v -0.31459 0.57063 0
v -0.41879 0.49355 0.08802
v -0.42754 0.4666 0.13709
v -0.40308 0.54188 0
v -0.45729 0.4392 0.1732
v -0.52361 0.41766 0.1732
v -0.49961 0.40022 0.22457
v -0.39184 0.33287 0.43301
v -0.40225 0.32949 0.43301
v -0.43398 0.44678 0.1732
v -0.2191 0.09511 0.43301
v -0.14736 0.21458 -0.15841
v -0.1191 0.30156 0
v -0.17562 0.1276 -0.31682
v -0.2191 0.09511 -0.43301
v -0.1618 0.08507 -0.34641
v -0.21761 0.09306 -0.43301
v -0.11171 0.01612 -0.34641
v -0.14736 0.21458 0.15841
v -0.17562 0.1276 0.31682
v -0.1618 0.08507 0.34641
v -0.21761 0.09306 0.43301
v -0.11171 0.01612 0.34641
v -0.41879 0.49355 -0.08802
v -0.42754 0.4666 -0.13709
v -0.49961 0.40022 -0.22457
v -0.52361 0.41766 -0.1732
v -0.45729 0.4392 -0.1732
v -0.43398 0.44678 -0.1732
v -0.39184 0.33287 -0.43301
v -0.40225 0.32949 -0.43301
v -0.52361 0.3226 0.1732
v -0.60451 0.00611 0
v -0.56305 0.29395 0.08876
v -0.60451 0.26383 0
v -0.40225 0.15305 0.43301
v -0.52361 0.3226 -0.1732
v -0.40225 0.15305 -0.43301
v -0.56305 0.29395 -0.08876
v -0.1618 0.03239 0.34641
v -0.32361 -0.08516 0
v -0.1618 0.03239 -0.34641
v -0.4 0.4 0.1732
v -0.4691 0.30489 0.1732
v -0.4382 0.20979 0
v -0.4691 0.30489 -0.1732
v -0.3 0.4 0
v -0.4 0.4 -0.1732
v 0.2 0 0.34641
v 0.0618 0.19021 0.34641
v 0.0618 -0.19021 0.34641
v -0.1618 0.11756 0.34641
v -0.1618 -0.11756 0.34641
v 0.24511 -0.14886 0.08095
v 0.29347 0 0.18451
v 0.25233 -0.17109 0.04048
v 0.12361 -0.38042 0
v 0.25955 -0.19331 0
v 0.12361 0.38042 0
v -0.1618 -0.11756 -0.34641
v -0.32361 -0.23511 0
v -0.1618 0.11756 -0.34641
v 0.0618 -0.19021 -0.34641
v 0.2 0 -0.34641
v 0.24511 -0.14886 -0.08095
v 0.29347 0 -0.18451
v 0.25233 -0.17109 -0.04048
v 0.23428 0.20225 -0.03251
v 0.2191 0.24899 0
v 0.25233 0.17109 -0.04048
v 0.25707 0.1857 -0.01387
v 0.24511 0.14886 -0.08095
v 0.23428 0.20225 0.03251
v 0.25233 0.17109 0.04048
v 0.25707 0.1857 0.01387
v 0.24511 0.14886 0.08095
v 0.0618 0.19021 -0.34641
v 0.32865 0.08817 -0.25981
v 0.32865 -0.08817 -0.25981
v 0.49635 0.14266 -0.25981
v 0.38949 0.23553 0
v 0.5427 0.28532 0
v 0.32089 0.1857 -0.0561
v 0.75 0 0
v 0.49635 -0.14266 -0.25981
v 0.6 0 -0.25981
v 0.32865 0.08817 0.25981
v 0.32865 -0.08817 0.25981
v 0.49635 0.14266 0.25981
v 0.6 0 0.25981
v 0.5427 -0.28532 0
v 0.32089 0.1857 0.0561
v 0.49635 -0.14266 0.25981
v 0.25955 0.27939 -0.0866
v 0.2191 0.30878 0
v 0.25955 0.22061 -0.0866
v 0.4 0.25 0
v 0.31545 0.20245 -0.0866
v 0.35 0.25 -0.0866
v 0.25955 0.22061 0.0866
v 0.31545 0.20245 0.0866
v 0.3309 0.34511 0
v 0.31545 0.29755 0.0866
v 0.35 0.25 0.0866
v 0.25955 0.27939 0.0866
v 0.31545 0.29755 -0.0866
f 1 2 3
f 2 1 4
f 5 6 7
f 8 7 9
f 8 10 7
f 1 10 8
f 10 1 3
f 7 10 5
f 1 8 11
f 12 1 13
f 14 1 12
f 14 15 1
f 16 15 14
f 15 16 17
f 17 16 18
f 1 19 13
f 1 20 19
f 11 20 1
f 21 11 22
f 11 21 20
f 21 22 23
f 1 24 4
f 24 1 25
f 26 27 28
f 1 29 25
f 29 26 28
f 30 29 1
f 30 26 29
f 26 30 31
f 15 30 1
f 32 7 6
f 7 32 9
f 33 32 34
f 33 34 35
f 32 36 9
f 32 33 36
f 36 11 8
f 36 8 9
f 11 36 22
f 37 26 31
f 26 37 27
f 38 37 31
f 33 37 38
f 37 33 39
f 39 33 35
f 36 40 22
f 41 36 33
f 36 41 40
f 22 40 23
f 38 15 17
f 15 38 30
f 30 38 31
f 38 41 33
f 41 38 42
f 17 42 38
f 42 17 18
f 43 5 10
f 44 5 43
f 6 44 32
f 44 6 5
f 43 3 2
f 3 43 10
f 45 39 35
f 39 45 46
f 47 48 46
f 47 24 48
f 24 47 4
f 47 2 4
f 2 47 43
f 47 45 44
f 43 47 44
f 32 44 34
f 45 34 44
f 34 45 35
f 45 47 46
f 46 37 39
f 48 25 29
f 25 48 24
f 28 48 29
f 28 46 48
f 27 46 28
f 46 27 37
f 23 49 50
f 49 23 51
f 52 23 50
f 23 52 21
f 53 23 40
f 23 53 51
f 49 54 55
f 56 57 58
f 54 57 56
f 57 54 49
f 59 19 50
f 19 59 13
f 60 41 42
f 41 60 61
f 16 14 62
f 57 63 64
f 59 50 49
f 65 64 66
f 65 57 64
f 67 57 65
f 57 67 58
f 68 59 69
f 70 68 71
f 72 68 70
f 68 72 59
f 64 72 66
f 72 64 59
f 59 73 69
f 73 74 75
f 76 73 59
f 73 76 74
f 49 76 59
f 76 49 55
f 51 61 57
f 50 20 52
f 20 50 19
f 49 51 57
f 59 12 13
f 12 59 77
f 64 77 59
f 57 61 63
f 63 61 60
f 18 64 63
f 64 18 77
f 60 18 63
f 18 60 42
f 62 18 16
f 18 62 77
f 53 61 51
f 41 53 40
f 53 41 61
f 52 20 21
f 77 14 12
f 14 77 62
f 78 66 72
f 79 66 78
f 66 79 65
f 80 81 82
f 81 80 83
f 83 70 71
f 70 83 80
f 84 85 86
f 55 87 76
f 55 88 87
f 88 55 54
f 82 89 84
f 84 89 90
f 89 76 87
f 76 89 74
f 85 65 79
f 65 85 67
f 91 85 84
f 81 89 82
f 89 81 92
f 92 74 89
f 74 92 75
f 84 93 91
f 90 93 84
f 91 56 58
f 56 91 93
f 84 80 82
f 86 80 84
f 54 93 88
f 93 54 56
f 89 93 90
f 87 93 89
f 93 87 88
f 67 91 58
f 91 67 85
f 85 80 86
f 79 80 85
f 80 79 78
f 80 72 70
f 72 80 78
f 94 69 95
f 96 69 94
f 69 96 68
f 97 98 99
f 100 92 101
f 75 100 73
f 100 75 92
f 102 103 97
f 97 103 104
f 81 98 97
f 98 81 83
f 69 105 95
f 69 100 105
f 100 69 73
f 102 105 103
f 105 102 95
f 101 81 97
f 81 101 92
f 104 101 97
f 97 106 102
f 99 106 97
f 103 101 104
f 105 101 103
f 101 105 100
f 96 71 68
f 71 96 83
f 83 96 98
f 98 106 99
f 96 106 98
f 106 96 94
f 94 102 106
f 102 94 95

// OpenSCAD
union(0.2) {

difference(0.5) {
  intersection(0.1) {
    translate([-.5,0,0]) sphere(.6);
    translate([-0.2,0.3,0]) sphere(.5);
  }
  translate([-.5,.4,0]) sphere(.2);
}
sphere(0.4);
translate([0.45,0,0]) sphere(0.3);
translate([0.3,0.25,0]) sphere(0.1);
}
